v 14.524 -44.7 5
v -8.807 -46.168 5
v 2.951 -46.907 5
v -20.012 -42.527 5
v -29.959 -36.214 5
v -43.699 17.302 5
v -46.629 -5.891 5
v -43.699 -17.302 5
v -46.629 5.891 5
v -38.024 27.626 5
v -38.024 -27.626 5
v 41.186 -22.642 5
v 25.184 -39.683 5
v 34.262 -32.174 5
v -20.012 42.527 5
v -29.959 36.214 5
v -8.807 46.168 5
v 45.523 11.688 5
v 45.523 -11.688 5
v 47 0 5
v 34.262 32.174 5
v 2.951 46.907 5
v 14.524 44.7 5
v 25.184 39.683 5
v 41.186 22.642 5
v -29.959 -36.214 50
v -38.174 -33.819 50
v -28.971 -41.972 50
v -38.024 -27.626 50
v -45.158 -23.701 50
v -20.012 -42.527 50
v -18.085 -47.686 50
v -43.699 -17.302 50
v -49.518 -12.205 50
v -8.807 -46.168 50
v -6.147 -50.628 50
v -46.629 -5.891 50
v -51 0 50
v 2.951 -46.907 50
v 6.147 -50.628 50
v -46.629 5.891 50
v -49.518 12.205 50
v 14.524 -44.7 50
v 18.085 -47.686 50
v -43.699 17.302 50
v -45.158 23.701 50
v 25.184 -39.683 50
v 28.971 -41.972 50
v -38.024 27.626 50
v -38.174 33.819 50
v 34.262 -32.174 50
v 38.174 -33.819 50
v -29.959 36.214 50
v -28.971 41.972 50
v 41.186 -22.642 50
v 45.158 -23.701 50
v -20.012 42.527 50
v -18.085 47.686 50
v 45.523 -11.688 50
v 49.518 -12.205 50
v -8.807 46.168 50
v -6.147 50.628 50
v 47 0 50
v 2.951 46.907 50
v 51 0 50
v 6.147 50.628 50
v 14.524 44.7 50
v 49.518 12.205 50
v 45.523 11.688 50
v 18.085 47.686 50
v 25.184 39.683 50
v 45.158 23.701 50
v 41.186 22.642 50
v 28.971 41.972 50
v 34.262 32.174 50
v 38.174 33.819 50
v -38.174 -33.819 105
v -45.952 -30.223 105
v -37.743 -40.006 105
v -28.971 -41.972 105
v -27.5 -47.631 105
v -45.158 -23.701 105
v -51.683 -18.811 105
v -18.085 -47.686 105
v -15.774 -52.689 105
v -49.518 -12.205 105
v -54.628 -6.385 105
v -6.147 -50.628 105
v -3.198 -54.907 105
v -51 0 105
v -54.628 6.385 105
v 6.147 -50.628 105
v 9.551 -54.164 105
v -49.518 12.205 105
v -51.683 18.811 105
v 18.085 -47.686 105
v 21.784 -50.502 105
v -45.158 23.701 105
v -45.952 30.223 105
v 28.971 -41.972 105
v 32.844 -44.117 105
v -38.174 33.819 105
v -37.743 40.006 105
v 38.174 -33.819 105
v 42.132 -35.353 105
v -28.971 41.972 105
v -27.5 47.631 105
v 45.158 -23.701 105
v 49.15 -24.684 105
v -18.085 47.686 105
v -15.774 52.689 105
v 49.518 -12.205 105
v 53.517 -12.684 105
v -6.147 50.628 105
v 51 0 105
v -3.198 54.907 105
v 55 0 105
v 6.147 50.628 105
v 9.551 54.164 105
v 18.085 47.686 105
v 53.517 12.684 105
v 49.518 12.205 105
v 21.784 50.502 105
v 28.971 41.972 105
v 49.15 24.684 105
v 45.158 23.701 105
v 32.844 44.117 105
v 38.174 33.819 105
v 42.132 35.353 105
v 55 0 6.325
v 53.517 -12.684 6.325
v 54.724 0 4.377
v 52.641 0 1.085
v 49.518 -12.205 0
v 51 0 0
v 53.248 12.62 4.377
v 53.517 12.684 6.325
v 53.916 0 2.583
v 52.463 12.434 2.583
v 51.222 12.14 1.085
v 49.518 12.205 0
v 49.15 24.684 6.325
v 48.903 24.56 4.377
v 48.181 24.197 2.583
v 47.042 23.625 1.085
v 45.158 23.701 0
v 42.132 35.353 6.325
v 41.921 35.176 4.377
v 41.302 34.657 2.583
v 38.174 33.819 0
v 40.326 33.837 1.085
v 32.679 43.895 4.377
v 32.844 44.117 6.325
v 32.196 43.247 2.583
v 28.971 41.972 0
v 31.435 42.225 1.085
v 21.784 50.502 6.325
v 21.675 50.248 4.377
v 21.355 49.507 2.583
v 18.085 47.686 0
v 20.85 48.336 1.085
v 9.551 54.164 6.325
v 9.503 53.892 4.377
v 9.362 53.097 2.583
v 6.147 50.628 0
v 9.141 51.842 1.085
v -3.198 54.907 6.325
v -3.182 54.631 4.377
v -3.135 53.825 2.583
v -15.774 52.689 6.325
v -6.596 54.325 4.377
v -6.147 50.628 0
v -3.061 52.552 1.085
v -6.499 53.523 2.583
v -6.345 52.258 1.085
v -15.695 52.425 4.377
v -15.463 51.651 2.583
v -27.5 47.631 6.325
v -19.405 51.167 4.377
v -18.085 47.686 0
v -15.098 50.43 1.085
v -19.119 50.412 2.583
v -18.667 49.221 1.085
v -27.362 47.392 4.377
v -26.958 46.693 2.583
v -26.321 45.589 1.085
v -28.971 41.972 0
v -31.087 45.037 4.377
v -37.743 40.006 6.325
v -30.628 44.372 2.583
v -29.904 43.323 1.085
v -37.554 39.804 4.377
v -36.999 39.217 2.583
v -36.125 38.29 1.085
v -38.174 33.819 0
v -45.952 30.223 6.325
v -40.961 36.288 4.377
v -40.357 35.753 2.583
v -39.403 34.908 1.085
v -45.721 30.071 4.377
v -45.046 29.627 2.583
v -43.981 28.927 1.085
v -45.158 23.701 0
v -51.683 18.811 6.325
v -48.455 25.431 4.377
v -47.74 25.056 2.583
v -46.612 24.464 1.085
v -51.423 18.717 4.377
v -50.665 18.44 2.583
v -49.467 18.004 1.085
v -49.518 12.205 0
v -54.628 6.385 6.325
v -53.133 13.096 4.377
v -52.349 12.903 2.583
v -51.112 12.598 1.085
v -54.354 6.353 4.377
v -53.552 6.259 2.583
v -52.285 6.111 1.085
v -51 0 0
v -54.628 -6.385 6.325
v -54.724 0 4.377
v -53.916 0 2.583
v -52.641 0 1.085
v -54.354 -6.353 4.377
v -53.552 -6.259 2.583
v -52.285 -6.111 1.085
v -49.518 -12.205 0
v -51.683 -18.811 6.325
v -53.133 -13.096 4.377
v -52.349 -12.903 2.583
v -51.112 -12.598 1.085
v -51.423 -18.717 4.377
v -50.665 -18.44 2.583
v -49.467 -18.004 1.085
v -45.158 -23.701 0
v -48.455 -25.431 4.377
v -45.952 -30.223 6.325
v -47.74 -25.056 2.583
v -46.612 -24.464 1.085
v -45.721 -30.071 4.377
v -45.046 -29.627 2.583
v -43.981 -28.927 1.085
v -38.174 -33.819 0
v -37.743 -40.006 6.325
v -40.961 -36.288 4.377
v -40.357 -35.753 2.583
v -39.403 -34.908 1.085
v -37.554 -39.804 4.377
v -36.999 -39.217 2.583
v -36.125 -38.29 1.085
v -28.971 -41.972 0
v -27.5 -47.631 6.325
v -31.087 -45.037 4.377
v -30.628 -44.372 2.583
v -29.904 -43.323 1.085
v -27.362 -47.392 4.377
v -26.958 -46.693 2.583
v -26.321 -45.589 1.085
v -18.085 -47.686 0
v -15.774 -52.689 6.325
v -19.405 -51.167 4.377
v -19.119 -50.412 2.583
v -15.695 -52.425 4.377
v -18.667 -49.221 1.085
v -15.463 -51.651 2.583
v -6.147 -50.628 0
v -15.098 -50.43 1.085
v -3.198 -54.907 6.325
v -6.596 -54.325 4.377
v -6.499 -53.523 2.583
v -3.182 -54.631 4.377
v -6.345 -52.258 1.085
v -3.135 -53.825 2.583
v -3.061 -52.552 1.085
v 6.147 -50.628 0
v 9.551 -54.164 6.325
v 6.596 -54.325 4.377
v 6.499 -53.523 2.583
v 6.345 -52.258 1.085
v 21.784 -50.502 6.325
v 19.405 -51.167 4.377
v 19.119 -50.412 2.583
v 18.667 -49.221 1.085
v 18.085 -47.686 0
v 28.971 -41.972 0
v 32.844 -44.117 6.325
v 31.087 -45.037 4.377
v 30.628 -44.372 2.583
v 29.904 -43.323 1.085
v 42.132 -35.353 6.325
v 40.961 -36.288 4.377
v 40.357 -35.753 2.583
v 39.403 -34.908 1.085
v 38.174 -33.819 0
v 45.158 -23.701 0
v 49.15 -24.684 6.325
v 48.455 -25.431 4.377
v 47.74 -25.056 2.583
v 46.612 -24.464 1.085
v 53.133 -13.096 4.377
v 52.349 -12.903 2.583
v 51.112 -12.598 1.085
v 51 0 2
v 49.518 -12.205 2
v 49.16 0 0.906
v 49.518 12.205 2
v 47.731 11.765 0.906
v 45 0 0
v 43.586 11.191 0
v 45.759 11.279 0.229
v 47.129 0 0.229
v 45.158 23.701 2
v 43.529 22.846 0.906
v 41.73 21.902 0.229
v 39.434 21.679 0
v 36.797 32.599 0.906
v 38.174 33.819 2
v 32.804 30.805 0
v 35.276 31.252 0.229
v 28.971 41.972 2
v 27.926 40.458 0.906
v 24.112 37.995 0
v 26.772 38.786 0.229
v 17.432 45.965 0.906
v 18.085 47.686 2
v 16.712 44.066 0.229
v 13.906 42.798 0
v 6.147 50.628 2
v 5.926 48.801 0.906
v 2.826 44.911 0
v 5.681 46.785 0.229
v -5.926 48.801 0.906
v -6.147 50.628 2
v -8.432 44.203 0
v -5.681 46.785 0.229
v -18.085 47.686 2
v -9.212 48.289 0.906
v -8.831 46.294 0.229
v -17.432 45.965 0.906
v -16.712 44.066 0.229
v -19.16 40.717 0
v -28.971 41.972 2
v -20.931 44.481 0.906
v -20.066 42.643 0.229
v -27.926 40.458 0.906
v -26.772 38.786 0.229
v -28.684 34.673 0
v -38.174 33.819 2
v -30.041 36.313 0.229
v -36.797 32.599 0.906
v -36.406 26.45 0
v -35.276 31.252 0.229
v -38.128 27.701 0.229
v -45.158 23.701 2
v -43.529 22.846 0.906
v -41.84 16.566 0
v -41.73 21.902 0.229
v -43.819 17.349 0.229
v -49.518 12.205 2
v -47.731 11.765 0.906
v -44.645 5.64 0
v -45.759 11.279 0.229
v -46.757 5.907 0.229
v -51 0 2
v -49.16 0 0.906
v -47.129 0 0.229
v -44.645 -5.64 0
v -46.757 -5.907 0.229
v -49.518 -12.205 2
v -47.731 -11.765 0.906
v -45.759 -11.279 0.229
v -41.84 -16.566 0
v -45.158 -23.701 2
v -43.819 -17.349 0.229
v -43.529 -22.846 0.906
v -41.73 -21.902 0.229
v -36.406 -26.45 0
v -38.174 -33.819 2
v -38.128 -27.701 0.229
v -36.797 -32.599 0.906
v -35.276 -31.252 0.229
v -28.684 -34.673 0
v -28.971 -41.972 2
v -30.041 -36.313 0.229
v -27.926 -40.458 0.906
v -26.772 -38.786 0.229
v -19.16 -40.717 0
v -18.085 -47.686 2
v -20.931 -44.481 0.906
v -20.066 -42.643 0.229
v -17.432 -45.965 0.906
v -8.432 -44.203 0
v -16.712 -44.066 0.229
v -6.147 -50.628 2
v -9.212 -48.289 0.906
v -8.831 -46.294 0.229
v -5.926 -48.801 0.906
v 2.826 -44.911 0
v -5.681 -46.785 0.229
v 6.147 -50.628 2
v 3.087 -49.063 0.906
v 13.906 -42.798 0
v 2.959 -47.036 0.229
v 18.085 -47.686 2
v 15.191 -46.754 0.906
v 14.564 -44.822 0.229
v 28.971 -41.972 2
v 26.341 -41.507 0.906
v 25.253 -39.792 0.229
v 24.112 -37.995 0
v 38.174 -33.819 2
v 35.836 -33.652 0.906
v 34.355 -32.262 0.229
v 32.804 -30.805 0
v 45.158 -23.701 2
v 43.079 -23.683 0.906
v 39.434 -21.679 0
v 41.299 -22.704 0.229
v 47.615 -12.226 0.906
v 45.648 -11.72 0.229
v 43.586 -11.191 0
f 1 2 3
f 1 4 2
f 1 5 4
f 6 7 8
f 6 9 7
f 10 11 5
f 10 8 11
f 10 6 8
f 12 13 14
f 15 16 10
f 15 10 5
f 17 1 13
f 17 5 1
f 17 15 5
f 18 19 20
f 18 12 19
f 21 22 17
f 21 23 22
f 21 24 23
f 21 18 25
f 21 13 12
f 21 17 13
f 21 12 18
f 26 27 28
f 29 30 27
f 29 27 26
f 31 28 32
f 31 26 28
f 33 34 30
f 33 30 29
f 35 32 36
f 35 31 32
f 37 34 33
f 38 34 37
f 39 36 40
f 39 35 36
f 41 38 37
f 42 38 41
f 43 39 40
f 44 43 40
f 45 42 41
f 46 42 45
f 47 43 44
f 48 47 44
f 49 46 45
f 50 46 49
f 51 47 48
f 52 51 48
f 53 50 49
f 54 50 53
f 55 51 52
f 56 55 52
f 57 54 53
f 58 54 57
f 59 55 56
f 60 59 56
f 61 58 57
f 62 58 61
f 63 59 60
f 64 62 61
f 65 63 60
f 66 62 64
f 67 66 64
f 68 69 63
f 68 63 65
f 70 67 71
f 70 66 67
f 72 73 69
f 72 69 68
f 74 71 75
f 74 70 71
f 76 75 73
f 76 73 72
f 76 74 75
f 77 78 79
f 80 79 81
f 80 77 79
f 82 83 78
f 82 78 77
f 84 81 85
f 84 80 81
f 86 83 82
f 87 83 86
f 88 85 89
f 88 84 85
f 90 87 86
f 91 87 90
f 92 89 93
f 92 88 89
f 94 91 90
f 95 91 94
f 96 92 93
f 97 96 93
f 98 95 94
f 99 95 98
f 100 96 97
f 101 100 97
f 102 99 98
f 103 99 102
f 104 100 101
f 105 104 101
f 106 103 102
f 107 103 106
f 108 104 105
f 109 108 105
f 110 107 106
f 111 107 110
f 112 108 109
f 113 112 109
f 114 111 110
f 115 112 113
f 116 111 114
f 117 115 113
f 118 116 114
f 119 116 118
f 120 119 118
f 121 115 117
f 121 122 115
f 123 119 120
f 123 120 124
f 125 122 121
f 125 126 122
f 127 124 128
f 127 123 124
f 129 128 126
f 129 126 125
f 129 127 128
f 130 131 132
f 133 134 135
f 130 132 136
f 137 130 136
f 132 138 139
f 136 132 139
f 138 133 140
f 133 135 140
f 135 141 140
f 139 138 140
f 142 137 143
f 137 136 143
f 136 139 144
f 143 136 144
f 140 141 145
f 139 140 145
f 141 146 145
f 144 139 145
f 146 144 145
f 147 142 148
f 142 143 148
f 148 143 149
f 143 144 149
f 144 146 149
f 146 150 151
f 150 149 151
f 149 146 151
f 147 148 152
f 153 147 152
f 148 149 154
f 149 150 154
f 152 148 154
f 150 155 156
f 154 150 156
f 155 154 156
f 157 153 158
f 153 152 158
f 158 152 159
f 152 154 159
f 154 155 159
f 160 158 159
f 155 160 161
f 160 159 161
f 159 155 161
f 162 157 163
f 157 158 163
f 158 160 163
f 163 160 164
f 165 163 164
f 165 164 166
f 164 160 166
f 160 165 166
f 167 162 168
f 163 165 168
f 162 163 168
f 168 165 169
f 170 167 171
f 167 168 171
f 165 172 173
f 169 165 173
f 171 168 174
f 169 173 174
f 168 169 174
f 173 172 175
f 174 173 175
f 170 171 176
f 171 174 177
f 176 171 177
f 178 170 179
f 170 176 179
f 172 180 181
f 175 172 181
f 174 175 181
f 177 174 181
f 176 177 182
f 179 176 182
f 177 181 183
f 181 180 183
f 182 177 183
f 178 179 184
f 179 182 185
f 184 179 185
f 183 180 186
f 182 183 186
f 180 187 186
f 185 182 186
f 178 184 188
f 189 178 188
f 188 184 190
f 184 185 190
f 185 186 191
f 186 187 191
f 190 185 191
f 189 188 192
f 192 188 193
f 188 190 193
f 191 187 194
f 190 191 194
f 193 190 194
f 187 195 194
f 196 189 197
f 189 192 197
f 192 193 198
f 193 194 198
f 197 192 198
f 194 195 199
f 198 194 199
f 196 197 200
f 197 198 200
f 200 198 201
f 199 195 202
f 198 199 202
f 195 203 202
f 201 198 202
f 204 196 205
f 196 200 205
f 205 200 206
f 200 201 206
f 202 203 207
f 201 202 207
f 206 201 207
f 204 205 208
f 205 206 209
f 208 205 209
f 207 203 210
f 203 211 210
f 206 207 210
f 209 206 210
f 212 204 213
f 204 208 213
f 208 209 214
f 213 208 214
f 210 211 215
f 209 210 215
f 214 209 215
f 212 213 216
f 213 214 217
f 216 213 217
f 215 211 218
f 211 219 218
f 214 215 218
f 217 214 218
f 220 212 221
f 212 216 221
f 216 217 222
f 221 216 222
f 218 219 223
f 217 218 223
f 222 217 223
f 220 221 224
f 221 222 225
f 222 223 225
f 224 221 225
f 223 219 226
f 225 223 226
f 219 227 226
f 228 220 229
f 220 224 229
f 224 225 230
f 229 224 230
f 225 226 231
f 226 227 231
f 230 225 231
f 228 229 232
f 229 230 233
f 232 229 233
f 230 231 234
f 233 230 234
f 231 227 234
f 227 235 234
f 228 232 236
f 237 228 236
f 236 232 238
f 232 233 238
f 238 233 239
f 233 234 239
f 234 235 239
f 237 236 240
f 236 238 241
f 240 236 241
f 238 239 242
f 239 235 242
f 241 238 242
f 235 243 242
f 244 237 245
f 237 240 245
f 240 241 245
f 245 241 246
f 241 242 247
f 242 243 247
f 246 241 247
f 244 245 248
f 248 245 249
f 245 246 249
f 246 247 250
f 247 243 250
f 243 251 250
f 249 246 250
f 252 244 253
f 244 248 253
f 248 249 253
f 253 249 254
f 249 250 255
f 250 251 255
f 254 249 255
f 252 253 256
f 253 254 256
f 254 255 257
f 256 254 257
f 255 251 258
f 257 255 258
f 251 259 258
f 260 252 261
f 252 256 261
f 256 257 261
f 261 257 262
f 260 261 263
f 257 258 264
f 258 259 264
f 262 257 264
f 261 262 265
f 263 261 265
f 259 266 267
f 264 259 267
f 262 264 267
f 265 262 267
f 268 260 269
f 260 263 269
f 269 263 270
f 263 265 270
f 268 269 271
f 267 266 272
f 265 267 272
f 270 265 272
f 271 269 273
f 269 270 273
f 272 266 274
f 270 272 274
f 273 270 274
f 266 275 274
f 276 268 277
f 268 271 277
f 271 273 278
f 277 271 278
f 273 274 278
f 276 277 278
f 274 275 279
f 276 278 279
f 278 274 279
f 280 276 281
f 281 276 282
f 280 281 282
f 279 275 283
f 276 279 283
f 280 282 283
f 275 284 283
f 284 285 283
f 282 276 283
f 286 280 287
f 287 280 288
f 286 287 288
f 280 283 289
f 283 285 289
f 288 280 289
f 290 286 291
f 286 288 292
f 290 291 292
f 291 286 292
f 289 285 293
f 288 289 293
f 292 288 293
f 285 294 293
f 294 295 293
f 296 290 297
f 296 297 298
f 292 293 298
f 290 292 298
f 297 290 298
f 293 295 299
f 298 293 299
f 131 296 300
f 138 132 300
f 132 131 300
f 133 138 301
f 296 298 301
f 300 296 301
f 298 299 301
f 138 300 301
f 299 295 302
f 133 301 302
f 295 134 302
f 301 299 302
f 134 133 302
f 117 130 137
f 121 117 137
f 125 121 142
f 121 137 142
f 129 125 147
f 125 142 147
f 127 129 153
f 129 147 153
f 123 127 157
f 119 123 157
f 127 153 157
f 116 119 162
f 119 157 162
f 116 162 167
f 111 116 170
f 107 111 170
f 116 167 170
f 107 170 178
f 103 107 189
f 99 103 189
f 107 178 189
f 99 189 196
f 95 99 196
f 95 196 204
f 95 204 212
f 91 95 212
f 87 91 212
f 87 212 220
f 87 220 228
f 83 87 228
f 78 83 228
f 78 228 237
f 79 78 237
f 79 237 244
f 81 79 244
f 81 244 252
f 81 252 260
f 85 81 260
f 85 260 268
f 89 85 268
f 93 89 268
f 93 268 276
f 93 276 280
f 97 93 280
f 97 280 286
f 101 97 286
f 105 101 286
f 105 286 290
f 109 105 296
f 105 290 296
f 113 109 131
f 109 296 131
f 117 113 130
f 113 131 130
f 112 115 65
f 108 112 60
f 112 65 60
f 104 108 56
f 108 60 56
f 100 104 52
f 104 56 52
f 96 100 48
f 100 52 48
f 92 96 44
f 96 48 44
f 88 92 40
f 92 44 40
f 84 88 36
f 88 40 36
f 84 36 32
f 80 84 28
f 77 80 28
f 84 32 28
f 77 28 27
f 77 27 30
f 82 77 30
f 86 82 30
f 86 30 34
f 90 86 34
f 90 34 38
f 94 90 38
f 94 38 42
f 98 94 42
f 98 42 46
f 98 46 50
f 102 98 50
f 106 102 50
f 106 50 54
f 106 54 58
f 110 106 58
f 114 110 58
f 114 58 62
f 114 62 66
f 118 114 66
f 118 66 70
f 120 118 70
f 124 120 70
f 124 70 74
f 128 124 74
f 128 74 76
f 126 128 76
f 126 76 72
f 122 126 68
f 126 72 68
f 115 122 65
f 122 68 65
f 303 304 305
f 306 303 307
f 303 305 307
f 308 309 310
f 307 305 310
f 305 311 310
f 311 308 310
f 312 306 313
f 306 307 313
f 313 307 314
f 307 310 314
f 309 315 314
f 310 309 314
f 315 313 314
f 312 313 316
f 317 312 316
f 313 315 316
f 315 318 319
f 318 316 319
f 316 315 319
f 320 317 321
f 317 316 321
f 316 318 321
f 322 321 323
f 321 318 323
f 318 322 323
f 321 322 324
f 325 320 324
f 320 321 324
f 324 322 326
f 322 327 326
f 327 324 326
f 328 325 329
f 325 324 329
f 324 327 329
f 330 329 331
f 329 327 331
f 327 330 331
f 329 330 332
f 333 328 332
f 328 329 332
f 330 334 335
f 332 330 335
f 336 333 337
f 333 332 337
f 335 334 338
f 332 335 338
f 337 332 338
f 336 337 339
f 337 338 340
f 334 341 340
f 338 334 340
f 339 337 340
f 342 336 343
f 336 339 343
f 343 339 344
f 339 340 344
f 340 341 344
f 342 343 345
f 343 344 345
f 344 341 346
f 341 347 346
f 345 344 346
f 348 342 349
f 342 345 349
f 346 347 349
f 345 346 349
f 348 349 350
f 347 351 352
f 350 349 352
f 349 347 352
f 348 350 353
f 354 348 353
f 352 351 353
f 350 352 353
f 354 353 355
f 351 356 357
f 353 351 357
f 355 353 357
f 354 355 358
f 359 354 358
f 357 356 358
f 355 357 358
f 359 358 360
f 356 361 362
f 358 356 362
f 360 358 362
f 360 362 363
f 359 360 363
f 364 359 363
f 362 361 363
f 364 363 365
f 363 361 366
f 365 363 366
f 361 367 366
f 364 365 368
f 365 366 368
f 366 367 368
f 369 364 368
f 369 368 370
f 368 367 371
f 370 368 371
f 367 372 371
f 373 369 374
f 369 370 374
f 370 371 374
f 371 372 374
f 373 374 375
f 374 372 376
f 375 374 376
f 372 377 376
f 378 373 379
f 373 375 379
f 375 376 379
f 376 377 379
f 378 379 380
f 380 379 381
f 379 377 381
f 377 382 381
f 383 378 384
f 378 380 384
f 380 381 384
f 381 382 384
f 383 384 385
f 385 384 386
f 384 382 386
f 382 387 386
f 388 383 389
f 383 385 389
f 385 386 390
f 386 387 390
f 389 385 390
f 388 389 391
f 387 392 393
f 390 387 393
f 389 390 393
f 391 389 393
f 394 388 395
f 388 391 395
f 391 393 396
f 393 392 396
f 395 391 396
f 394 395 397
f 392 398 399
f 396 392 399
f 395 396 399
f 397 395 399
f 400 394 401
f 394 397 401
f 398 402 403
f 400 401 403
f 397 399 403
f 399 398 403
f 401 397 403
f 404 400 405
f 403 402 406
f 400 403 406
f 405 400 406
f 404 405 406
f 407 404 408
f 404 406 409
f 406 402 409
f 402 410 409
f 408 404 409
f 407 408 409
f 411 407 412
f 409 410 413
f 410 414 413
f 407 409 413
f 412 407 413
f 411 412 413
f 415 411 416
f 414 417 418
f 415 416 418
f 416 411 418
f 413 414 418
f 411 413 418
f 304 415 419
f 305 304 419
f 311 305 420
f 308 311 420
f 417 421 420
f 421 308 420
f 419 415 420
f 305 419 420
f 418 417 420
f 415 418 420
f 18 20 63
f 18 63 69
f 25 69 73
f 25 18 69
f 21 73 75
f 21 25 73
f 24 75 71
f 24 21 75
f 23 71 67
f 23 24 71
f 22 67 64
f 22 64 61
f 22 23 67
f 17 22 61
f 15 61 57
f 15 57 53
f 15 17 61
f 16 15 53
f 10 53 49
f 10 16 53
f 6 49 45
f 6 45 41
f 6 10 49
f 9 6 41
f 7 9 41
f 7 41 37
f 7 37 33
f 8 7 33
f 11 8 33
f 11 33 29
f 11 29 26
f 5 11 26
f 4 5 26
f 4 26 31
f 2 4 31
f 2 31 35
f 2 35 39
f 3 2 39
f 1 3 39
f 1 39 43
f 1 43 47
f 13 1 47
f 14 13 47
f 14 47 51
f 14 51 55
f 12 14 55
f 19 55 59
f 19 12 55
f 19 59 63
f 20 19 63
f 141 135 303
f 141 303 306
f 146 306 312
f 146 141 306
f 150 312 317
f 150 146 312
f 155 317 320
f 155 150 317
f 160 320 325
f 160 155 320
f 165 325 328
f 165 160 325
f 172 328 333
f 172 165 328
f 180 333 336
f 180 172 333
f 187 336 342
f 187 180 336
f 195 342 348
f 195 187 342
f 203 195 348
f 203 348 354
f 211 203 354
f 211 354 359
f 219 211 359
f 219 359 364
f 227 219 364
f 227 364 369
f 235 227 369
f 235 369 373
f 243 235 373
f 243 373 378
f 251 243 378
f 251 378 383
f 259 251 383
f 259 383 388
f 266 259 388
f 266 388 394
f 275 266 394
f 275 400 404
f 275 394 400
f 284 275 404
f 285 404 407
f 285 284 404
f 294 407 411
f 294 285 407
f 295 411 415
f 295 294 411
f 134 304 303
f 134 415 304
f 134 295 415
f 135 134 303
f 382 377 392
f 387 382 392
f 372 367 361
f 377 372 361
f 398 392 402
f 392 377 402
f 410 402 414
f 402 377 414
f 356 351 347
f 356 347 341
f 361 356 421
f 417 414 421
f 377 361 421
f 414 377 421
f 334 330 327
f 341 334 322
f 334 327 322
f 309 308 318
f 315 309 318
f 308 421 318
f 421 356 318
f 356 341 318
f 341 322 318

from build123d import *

# Parameters (mm, degrees)
F0_R     = 55
F0_R_2   = 51
F0_R_3   = 47
F1_DEPTH = 5
F2_DEPTH = 50
F3_DEPTH = 100
F4_R     = 10
F5_DEPTH = 25
F6_DEPTH = 25
F7_DEPTH = 25


# Not quite as in the source:
# - a fillet or chamfer that OpenCascade refuses, or shapes differently, is made with other operations: its cross-section is extruded or revolved along the edge and cut away or added


with BuildPart() as f1:
    # F0 (on Top) → F1 (new body)
    with BuildSketch(Plane.XY):
        Circle(F0_R)
        Circle(F0_R_2, mode=Mode.SUBTRACT)
        Circle(F0_R_2)
        Circle(F0_R_3, mode=Mode.SUBTRACT)
        Circle(F0_R_3)
    extrude(amount=F1_DEPTH)

    # F0 (on Top) → F2 (join)
    with BuildSketch(Plane.XY):
        Circle(F0_R_2)
        Circle(F0_R_3, mode=Mode.SUBTRACT)
    extrude(amount=F2_DEPTH)

    # F3 (add): a face of the model
    f3_faces = [f1.faces().sort_by_distance(p)[0] for p in [
        (-53.4443650814, 0, 5),
    ]]
    extrude(f3_faces, amount=F3_DEPTH)

    # F4
    f4_edges = [f1.edges().sort_by_distance(p)[0] for p in [
        (-55, 0, 0),
    ]]
    fillet(f4_edges, radius=F4_R)

    # F0 (on Top) → F5 (join)
    with BuildSketch(Plane.XY):
        Circle(F0_R)
        Circle(F0_R_2, mode=Mode.SUBTRACT)
    extrude(amount=F5_DEPTH)

    # F0 (on Top) → F6 (join)
    with BuildSketch(Plane.XY):
        Circle(F0_R)
        Circle(F0_R_2, mode=Mode.SUBTRACT)
    extrude(amount=F6_DEPTH)

    # F0 (on Top) → F7 (join)
    with BuildSketch(Plane.XY):
        Circle(F0_R)
        Circle(F0_R_2, mode=Mode.SUBTRACT)
    extrude(amount=F7_DEPTH)

    # F8: fillet of radius 7 on 1 edges, made by hand

    # F8_s1 → F8_t2 (revolve, cut)
    with BuildSketch(Plane.XZ):
        with BuildLine():
            ThreePointArc((55, 6.3245553203), (53.9160797831, 2.5828979336), (51, 0))
            Line((51, 0), (55, 0))
            Line((55, 0), (55, 6.3245553203))
        make_face()
    revolve(axis=Axis((0, 0, 0), (0, 0, 1)), mode=Mode.SUBTRACT)


solid = f1.part
